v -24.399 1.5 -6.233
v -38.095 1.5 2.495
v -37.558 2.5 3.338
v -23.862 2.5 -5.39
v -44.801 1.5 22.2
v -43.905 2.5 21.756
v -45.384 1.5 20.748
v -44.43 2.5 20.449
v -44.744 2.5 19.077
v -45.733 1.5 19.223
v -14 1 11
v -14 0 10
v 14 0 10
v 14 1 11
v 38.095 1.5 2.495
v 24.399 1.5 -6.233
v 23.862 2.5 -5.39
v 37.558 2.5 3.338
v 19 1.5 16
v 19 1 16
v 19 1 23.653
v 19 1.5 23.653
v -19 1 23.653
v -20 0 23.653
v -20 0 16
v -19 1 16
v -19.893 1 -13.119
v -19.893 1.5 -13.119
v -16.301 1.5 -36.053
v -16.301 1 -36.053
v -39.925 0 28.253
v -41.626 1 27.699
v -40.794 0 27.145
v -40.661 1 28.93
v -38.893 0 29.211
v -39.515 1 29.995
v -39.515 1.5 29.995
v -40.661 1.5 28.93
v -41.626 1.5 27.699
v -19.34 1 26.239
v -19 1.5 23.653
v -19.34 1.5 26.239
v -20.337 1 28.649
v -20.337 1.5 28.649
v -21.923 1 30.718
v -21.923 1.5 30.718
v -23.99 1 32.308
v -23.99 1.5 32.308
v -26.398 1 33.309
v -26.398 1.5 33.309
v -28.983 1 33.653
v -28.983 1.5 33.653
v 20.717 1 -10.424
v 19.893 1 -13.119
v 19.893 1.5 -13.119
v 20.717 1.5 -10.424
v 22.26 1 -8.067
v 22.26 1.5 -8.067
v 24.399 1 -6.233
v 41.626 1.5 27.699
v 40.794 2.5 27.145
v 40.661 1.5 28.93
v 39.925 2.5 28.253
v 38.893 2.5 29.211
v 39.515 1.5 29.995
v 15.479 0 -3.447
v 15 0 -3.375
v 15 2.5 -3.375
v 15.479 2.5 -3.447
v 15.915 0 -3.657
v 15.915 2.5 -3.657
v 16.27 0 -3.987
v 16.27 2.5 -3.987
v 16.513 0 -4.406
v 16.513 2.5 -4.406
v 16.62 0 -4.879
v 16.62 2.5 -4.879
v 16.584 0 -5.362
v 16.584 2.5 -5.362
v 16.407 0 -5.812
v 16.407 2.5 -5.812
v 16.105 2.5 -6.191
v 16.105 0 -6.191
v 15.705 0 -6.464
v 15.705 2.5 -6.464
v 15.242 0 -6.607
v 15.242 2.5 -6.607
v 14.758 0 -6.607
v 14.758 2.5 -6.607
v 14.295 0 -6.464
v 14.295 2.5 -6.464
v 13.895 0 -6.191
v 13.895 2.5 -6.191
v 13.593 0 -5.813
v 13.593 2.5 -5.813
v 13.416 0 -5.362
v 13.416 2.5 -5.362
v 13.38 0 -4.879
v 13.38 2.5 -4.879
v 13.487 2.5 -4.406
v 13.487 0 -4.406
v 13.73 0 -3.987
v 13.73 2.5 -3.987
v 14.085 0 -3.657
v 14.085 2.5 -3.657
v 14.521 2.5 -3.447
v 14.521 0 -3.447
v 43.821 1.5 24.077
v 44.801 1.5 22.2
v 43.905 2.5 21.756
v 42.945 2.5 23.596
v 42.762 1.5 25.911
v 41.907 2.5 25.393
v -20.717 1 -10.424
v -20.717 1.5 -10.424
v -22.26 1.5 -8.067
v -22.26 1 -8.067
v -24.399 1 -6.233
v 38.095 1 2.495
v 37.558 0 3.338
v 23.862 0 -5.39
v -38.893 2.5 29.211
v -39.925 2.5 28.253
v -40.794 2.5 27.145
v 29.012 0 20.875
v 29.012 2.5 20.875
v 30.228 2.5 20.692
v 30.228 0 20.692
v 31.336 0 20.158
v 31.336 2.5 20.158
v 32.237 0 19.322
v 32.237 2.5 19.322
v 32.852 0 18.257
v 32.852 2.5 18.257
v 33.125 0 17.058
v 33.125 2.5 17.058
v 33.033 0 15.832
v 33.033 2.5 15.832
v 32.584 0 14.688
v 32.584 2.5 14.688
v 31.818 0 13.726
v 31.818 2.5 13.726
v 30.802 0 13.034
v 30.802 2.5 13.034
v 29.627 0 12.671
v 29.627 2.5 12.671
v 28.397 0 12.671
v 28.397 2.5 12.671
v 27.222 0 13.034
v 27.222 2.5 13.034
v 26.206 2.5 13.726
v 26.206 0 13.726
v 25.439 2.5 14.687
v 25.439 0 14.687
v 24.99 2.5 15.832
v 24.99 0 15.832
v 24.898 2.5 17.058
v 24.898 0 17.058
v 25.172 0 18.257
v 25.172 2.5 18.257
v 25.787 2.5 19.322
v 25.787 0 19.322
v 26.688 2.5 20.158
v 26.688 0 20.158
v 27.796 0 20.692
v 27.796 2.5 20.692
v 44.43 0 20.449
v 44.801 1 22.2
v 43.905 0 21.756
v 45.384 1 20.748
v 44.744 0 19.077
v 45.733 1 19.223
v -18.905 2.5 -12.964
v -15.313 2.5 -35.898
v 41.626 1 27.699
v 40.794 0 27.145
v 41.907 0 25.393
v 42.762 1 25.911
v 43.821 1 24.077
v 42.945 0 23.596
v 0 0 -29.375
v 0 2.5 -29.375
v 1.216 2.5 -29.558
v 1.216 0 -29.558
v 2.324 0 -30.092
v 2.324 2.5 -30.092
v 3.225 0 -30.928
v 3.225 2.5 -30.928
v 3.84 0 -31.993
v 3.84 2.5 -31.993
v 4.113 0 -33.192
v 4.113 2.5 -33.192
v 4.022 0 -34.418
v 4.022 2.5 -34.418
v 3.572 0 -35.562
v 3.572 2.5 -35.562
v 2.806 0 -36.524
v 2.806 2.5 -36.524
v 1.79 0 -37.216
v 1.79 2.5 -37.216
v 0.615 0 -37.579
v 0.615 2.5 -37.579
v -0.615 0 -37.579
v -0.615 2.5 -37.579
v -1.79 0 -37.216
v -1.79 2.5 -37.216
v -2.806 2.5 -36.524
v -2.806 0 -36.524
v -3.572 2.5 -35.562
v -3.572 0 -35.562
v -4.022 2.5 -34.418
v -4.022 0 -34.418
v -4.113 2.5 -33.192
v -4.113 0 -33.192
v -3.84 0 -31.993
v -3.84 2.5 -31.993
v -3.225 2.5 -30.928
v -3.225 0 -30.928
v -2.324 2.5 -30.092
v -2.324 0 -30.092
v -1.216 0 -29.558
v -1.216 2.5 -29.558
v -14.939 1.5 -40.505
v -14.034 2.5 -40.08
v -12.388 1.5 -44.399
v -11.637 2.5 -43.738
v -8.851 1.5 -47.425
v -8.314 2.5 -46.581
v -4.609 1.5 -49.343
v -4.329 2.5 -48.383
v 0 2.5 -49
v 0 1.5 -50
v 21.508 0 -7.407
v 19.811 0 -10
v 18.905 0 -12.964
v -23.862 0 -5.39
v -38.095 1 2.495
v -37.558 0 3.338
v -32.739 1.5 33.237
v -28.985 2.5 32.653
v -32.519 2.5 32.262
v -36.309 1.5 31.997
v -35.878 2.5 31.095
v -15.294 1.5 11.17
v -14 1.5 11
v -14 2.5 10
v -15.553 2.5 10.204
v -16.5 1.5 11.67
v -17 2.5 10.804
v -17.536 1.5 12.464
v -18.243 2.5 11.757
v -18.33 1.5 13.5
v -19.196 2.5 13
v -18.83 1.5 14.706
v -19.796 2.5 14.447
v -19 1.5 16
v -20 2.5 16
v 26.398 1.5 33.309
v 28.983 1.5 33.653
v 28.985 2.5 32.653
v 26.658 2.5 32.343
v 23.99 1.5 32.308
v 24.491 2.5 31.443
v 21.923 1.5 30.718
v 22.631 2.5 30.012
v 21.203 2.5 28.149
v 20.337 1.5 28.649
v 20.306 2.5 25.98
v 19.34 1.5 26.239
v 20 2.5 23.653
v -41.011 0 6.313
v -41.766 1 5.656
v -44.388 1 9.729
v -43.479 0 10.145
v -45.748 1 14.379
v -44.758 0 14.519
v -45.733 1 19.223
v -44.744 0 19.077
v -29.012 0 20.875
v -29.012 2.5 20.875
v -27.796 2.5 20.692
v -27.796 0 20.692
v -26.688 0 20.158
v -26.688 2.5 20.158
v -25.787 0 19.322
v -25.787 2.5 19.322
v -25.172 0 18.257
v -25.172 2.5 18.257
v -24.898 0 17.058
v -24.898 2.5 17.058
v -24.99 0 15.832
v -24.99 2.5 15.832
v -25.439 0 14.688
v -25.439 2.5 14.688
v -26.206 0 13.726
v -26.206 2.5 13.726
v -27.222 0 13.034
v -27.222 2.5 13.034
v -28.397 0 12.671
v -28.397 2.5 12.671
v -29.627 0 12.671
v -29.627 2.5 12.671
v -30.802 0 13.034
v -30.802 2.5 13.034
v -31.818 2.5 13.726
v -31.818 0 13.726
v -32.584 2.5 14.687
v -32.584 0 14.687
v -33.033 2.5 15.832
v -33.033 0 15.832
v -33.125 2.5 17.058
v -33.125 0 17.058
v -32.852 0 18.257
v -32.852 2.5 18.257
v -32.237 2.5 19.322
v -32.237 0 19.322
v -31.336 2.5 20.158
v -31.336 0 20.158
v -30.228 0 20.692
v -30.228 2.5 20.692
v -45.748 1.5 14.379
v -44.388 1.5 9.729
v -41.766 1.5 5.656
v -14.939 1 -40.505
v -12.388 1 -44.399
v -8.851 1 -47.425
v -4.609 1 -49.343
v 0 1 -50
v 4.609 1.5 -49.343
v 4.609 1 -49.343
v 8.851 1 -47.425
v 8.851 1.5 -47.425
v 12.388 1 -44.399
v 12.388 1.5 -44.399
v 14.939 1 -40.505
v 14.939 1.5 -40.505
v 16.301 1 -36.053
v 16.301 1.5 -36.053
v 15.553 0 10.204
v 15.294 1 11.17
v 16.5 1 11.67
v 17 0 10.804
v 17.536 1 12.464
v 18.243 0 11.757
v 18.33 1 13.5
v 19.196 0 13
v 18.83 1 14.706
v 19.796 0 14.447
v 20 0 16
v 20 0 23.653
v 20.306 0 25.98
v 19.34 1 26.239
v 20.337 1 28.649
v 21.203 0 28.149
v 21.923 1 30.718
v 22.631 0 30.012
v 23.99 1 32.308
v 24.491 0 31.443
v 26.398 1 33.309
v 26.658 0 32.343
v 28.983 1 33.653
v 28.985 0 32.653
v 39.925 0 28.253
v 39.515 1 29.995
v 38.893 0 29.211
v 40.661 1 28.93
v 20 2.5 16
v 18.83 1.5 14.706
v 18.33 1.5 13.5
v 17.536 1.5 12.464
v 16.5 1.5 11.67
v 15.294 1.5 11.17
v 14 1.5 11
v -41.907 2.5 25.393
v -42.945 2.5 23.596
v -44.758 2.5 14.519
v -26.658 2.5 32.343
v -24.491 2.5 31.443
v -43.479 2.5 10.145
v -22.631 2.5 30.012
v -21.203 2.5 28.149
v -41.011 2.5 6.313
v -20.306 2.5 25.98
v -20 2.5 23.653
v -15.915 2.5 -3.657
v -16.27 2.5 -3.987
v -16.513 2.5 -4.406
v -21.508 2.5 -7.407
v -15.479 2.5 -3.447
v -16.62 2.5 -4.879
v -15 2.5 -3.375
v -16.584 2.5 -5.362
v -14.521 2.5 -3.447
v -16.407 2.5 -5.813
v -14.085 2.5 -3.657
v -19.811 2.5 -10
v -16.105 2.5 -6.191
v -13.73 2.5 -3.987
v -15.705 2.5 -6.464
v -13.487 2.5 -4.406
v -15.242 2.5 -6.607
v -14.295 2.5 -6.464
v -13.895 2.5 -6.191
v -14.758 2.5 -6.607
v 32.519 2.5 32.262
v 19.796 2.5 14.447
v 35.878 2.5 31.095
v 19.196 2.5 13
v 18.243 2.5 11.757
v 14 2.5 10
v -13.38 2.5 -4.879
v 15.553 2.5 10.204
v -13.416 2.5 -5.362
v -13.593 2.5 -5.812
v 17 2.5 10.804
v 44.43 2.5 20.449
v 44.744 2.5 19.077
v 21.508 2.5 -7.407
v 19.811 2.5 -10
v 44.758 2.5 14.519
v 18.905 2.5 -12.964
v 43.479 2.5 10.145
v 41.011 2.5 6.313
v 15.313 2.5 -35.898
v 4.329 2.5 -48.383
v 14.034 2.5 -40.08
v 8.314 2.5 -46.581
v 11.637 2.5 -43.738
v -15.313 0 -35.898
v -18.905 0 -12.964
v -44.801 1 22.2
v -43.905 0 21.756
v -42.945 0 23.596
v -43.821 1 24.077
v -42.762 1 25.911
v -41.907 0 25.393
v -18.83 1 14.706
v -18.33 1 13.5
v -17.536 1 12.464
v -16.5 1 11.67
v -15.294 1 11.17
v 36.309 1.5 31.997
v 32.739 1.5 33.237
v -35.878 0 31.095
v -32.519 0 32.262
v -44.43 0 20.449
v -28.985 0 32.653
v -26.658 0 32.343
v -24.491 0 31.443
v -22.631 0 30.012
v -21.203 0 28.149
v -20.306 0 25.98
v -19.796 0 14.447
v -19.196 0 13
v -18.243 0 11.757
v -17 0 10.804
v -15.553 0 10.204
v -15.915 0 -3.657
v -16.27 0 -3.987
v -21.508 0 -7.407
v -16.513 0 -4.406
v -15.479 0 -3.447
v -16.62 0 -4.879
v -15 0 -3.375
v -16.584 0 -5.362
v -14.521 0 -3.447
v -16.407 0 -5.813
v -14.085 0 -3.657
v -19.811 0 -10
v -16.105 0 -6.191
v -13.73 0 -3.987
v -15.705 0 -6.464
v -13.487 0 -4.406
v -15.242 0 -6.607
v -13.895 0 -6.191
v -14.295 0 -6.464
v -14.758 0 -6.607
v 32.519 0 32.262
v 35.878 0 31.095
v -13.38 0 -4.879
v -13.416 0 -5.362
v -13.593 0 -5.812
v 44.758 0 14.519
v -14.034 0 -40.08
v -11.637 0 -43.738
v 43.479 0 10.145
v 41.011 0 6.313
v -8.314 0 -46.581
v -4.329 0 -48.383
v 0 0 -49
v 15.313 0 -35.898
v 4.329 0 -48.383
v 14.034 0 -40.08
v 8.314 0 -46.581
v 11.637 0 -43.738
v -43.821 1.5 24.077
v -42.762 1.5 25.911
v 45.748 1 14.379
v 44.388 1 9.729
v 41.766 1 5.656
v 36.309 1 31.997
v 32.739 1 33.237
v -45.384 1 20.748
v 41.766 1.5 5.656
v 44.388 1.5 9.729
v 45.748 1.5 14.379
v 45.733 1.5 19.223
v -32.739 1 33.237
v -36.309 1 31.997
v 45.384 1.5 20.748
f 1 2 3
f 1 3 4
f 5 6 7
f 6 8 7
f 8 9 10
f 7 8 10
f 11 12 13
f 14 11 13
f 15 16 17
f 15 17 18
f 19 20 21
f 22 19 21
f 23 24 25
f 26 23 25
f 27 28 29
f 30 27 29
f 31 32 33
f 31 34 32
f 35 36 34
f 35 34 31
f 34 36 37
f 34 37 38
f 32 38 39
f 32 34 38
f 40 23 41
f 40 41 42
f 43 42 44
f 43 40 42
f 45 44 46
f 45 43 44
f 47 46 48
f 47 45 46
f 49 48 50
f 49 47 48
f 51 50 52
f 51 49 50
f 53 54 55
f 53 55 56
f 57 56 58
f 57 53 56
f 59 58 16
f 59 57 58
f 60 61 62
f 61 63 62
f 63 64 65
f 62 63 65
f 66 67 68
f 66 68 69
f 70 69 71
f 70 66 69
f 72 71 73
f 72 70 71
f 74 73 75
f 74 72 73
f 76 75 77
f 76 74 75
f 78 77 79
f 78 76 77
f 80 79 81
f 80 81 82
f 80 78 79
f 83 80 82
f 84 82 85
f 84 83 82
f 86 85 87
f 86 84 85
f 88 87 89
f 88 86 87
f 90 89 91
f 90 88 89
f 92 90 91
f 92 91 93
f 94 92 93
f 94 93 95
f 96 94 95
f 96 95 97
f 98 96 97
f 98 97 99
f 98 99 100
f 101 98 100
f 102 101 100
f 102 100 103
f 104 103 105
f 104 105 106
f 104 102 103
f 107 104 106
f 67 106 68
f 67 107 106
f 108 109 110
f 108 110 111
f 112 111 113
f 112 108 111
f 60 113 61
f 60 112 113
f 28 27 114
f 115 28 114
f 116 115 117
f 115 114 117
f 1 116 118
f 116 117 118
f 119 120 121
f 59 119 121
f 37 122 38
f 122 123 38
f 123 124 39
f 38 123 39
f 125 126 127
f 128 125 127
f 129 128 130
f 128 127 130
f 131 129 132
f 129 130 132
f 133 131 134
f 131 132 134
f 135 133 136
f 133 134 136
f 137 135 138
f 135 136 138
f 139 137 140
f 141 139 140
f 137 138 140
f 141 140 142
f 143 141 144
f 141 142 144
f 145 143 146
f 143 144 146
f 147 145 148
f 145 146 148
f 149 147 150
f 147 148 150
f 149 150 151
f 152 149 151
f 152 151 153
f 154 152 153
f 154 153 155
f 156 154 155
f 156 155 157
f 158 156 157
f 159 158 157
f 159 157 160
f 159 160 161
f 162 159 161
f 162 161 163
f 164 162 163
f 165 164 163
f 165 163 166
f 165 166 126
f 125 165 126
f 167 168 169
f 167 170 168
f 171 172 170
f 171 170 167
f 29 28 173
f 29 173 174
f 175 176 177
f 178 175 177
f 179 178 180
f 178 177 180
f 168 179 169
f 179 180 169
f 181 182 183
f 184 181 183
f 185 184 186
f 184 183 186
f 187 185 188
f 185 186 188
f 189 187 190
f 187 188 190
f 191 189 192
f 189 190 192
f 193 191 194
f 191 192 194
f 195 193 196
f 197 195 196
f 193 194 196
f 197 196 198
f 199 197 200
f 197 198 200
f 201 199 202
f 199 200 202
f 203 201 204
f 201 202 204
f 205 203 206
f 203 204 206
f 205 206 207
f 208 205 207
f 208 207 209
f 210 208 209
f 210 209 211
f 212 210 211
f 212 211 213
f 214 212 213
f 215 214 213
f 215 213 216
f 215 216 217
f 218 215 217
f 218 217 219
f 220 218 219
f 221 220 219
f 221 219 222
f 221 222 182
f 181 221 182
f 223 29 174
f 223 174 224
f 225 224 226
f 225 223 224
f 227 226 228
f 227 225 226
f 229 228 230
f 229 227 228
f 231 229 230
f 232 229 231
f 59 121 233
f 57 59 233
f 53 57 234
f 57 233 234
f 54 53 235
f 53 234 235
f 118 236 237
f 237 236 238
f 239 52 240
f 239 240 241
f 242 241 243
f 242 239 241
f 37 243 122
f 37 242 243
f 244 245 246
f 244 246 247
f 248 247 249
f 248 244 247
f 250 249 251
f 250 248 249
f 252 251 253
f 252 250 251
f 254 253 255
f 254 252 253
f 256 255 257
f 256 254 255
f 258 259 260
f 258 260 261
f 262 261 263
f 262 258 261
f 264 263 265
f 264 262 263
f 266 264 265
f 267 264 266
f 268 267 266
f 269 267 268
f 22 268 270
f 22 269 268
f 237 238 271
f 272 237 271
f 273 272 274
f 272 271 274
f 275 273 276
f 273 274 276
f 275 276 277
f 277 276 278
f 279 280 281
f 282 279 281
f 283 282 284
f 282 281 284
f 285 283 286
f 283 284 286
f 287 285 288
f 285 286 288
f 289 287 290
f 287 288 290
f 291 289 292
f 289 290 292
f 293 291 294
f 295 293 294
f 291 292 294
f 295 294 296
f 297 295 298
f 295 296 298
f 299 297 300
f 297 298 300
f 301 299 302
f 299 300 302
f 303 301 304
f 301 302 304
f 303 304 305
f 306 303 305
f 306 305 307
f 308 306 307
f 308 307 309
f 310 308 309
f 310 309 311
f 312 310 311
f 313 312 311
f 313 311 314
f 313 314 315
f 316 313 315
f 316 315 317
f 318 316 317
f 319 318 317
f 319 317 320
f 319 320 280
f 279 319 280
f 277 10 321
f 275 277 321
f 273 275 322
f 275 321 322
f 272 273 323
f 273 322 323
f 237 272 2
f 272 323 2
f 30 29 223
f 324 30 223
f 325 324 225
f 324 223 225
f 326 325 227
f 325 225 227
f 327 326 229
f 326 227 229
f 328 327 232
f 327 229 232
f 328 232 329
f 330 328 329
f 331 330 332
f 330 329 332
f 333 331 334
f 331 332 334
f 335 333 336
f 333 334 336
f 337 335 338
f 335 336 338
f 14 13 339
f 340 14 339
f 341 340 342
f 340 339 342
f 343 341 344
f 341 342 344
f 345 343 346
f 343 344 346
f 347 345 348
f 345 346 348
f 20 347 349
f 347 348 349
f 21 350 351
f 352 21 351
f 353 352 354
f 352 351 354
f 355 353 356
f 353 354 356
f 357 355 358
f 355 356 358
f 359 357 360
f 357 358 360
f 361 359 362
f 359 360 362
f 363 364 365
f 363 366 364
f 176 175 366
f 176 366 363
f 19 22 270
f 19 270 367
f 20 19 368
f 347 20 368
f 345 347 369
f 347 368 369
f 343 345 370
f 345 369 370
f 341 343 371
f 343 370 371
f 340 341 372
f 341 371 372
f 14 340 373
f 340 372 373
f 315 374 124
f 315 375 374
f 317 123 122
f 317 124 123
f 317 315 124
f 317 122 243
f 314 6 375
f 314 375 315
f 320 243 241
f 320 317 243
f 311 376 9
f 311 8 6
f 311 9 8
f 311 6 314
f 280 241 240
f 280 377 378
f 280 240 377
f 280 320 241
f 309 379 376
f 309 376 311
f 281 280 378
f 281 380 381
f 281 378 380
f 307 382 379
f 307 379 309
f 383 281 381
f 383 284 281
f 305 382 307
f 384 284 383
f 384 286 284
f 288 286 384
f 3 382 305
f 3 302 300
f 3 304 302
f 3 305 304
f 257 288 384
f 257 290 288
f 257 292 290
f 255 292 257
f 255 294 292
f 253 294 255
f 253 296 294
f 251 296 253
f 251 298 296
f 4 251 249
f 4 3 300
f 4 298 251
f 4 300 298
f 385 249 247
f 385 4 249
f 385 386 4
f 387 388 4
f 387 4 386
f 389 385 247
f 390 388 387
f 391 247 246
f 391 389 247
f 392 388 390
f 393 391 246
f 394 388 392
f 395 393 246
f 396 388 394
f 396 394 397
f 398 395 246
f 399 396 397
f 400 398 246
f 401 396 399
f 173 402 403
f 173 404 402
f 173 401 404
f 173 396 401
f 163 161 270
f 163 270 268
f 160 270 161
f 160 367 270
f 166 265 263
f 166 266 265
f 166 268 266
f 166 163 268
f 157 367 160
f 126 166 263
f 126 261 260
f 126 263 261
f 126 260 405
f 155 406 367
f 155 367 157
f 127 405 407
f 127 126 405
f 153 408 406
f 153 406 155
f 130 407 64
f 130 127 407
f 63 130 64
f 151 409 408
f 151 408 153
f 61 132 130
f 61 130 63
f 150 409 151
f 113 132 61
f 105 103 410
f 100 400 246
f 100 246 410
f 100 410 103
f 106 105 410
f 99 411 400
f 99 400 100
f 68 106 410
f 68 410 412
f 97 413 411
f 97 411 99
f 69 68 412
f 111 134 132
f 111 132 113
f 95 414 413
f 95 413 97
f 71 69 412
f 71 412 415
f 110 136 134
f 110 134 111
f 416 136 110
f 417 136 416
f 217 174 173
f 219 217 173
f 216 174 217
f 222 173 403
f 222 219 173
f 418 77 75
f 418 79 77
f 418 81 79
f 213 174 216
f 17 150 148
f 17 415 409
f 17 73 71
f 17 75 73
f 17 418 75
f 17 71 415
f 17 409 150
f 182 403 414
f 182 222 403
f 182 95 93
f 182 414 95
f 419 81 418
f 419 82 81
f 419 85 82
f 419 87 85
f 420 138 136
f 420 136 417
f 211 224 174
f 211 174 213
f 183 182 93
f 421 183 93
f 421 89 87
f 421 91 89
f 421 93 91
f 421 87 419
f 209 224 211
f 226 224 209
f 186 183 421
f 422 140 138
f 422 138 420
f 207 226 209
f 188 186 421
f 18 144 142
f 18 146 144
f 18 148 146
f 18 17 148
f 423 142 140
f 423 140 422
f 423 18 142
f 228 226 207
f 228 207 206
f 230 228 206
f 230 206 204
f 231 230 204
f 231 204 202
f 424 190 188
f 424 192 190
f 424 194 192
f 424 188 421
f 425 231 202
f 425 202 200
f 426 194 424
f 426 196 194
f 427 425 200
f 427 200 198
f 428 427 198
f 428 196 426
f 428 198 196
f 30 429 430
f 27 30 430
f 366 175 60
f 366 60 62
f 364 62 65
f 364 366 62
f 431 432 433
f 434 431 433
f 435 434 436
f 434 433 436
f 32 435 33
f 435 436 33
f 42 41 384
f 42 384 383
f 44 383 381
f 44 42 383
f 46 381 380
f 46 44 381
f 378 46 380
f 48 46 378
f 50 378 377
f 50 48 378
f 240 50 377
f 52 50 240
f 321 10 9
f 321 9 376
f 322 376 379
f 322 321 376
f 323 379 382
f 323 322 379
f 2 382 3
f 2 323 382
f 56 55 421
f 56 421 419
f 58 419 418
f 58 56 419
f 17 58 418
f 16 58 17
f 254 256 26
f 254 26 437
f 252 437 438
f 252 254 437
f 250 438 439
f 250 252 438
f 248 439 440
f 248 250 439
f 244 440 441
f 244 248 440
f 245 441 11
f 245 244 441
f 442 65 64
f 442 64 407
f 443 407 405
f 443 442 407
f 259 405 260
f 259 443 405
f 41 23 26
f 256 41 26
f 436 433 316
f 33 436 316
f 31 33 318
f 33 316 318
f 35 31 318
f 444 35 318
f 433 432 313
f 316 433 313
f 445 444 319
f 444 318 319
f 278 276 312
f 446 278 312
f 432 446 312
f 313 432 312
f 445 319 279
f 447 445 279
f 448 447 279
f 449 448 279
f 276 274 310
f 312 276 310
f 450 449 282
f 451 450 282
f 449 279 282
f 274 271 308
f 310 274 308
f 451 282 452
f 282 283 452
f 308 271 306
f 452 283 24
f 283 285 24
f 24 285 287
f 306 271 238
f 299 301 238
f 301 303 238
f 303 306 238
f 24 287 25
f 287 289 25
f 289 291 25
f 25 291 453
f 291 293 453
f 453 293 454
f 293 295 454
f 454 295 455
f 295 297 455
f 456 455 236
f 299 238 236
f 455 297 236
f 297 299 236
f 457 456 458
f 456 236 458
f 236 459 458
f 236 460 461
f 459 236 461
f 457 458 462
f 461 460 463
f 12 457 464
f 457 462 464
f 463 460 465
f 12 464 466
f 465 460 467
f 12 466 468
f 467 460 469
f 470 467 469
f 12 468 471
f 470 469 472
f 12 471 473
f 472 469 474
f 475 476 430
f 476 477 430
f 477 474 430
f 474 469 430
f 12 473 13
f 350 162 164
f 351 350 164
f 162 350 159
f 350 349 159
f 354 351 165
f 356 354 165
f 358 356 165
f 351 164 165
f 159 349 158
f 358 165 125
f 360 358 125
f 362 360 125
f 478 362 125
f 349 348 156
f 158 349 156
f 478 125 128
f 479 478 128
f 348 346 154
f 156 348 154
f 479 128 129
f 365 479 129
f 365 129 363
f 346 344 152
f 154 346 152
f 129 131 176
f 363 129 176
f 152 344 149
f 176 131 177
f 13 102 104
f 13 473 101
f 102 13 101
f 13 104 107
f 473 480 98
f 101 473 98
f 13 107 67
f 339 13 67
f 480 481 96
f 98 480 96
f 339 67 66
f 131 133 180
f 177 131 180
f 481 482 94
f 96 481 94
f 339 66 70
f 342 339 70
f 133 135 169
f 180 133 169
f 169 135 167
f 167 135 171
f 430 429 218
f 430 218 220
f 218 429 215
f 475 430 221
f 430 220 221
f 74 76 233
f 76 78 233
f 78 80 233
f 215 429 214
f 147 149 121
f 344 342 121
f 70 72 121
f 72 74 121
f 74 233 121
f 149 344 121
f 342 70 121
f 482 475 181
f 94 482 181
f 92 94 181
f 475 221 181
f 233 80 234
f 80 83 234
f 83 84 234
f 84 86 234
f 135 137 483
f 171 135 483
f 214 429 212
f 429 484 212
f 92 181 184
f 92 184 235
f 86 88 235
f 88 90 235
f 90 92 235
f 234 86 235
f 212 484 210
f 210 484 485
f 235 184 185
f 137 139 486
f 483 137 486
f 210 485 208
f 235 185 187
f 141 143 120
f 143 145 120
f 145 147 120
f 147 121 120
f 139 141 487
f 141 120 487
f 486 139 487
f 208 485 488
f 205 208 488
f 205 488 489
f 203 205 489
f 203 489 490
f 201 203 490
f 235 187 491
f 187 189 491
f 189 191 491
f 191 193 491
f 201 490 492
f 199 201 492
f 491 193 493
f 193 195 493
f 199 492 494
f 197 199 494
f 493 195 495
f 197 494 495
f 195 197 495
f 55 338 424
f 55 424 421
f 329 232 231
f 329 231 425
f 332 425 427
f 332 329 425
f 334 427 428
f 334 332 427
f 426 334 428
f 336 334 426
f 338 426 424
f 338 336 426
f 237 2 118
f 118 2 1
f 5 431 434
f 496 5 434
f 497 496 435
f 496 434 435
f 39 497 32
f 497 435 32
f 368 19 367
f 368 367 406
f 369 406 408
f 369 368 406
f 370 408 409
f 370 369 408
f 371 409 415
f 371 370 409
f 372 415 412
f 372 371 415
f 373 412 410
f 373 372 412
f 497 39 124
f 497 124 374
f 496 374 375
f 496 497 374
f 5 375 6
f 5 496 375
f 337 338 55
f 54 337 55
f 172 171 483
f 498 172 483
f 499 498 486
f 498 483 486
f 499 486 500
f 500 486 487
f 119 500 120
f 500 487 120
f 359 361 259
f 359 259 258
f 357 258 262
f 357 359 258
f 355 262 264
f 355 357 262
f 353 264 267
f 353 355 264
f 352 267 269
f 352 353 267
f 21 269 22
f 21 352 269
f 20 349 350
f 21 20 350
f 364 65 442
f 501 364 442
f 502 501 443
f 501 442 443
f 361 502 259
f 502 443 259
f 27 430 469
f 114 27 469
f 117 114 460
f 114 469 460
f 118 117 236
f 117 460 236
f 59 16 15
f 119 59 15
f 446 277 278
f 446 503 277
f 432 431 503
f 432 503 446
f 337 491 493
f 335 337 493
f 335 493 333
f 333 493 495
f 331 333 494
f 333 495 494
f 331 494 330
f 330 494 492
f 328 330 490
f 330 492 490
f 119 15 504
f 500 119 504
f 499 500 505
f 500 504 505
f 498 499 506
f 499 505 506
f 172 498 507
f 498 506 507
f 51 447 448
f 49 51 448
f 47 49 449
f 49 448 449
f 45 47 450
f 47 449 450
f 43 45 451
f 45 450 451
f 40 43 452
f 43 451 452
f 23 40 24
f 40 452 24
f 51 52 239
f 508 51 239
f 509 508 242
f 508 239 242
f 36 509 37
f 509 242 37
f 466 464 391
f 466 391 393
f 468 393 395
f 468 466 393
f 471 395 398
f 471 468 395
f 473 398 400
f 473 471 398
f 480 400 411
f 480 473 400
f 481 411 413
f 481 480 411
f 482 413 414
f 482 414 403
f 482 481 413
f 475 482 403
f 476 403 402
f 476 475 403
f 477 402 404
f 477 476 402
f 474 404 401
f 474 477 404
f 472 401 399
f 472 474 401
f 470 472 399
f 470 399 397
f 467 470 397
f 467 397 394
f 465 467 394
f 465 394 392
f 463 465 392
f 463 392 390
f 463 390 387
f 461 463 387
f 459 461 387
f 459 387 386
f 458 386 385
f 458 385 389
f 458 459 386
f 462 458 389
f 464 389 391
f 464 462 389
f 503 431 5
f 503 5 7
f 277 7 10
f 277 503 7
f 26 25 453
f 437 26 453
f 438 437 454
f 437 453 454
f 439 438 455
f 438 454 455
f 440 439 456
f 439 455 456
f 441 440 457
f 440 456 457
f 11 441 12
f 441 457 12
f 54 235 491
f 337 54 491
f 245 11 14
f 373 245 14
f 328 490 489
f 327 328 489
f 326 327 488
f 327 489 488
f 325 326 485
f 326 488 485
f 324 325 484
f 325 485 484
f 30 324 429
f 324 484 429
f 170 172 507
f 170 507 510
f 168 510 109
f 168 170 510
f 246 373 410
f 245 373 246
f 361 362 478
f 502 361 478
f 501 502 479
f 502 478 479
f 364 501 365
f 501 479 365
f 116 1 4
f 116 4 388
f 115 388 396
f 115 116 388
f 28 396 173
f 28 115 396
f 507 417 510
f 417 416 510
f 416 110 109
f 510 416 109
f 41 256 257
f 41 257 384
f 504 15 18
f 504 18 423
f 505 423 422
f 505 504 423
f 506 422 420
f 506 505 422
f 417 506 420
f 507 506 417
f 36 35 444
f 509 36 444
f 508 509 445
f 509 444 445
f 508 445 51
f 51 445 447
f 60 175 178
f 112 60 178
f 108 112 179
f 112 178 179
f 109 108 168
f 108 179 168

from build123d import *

# Parameters (mm, degrees)
SKETCH1_R           = 1.625
BOSS_EXTRUDE1_DEPTH = 2.5
FILLET1_R           = 5
SKETCH3_R           = 4.125
CUT_EXTRUDE2_DEPTH  = 71.75485849
CUT_EXTRUDE3_DEPTH  = 71.75485849
FILLET2_R           = 10
CHAMFER1_SIZE       = 1


with BuildPart() as part:
    # Sketch1 → Boss-Extrude1 (new body)
    with BuildSketch(Plane(origin=(0, 0, 0), x_dir=(1, 0, 0), z_dir=(0, 1, 0))):
        with BuildLine():
            ThreePointArc((50, 0), (-27.838821814, 41.533119315), (-19, -46.249324319))
            Line((-19, -46.249324319), (-19, -11))
            Line((-19, -11), (19, -11))
            Line((19, -11), (19, -46.249324319))
            ThreePointArc((19, -46.249324319), (41.533119315, -27.838821814), (50, 0))
        make_face()
        with Locations(Location((-15, 5, 0), (0, 0, 270))):
            Circle(SKETCH1_R, mode=Mode.SUBTRACT)
        with Locations(Location((15, 5, 0), (0, 0, 270))):
            Circle(SKETCH1_R, mode=Mode.SUBTRACT)
    extrude(amount=BOSS_EXTRUDE1_DEPTH)

    # Fillet1
    fillet1_edges = [part.edges().sort_by_distance(p)[0] for p in [
        (19, 1.25, 46.249324319),
        (19, 1.25, 11),
        (-19, 1.25, 11),
        (-19, 1.25, 46.249324319),
    ]]
    fillet(fillet1_edges, radius=FILLET1_R)

    # Sketch3 → Cut-Extrude2 (cut, through all)
    with BuildSketch(Plane(origin=(0, 2.5, 0), x_dir=(1, 0, 0), z_dir=(0, 1, 0))):
        with Locations(Location((0, 33.5, 0), (0, 0, 270))):
            Circle(SKETCH3_R)
        with Locations(Location((29.011851027, -16.75, 0), (0, 0, 270))):
            Circle(SKETCH3_R)
        with Locations(Location((-29.011851027, -16.75, 0), (0, 0, 270))):
            Circle(SKETCH3_R)
    extrude(amount=-CUT_EXTRUDE2_DEPTH, mode=Mode.SUBTRACT)

    # Sketch4 → Cut-Extrude3 (cut, through all)
    with BuildSketch(Plane(origin=(0, 2.5, 0), x_dir=(1, 0, 0), z_dir=(0, 1, 0))):
        with BuildLine():
            ThreePointArc((-19, -30.369481935), (-30.236455629, -33.609056698), (-40.88679997, -28.779673178))
            ThreePointArc((-40.88679997, -28.779673178), (-34.446124239, -36.241751129), (-26.666666667, -42.295258468))
            ThreePointArc((-26.666666667, -42.295258468), (-21.584770542, -42.4437078), (-19, -38.065732621))
            Line((-19, -38.065732621), (-19, -30.369481935))
        make_face()
        with BuildLine():
            Line((19, -30.369481935), (19, -38.065732621))
            ThreePointArc((19, -38.065732621), (21.584770542, -42.4437078), (26.666666667, -42.295258468))
            ThreePointArc((26.666666667, -42.295258468), (34.446124239, -36.241751129), (40.88679997, -28.779673178))
            ThreePointArc((40.88679997, -28.779673178), (30.236455629, -33.609056698), (19, -30.369481935))
        make_face()
        with BuildLine():
            ThreePointArc((-6.8e-08, 50), (-42.136436408, 26.916922685), (-45.36732807, -21.019170864))
            ThreePointArc((-45.36732807, -21.019170864), (-44.746417351, -10.573360804), (-38.095485584, -2.49464899))
            Line((-38.095485584, -2.49464899), (-20.59178284, 8.658863751))
            Line((-20.59178284, 8.658863751), (-16.301275801, 36.053117163))
            ThreePointArc((-16.301275801, 36.053117163), (-10.7266856, 46.037472474), (-6.8e-08, 50))
        make_face()
        with BuildLine():
            ThreePointArc((45.36732807, -21.019170864), (42.136436371, 26.916922743), (-6.8e-08, 50))
            ThreePointArc((-6.8e-08, 50), (10.726685548, 46.037472518), (16.301275801, 36.053117163))
            Line((16.301275801, 36.053117163), (20.59178284, 8.658863751))
            Line((20.59178284, 8.658863751), (38.095485584, -2.49464899))
            ThreePointArc((38.095485584, -2.49464899), (44.746417351, -10.573360804), (45.36732807, -21.019170864))
        make_face()
    extrude(amount=-CUT_EXTRUDE3_DEPTH, mode=Mode.SUBTRACT)

    # Fillet2
    fillet2_edges = [part.edges().sort_by_distance(p)[0] for p in [
        (40.88679997, 1.25, 28.779673178),
        (-45.36732807, 1.25, 21.019170864),
        (-20.59178284, 1.25, -8.658863751),
        (45.36732807, 1.25, 21.019170864),
        (20.59178284, 1.25, -8.658863751),
        (-40.88679997, 1.25, 28.779673178),
        (-19, 1.25, 30.369481935),
        (19, 1.25, 30.369481935),
    ]]
    fillet(fillet2_edges, radius=FILLET2_R)

    # Chamfer1
    chamfer1_edges = [part.edges().sort_by_distance(p)[0] for p in [
        (-44.388404549, 2.5, 9.729383862),
        (-18.097260259, 2.5, -24.5860218),
        (-44.388404549, 0, 9.729383862),
        (-18.097260259, 0, -24.5860218),
        (-43.301270189, 2.5, 25),
        (-43.301270189, 0, 25),
        (-34.559008869, 2.5, 32.717356984),
        (-19, 2.5, 19.826732149),
        (34.559008869, 2.5, 32.717356984),
        (43.301270189, 2.5, 25),
        (44.388404549, 2.5, 9.729383862),
        (31.247232254, 2.5, -1.86911803),
        (-31.247232254, 2.5, -1.86911803),
        (21.922865426, 2.5, 30.718460138),
        (-21.922865426, 2.5, 30.718460138),
        (40.660570606, 2.5, 28.929698969),
        (45.384139534, 2.5, 20.748237593),
        (-45.384139534, 2.5, 20.748237593),
        (-40.660570606, 2.5, 28.929698969),
        (-34.559008869, 0, 32.717356984),
        (-31.247232254, 0, -1.86911803),
        (31.247232254, 0, -1.86911803),
        (44.388404549, 0, 9.729383862),
        (43.301270189, 0, 25),
        (34.559008869, 0, 32.717356984),
        (-19, 0, 19.826732149),
        (21.922865426, 0, 30.718460138),
        (-21.922865426, 0, 30.718460138),
        (40.660570606, 0, 28.929698969),
        (45.384139534, 0, 20.748237593),
        (-45.384139534, 0, 20.748237593),
        (-40.660570606, 0, 28.929698969),
        (21.40495945, 2.5, -9.190948509),
        (21.40495945, 0, -9.190948509),
        (-21.40495945, 2.5, -9.190948509),
        (-21.40495945, 0, -9.190948509),
        (19, 0, 19.826732149),
        (0, 0, 11),
        (19, 2.5, 19.826732149),
        (0, 2.5, 11),
        (17.535533906, 0, 12.464466094),
        (17.535533906, 2.5, 12.464466094),
        (-17.535533906, 0, 12.464466094),
        (-17.535533906, 2.5, 12.464466094),
        (18.097260259, 0, -24.5860218),
        (0, 2.5, -50),
        (0, 0, -50),
        (18.097260259, 2.5, -24.5860218),
    ]]
    chamfer(chamfer1_edges, length=CHAMFER1_SIZE)


solid = part.part
